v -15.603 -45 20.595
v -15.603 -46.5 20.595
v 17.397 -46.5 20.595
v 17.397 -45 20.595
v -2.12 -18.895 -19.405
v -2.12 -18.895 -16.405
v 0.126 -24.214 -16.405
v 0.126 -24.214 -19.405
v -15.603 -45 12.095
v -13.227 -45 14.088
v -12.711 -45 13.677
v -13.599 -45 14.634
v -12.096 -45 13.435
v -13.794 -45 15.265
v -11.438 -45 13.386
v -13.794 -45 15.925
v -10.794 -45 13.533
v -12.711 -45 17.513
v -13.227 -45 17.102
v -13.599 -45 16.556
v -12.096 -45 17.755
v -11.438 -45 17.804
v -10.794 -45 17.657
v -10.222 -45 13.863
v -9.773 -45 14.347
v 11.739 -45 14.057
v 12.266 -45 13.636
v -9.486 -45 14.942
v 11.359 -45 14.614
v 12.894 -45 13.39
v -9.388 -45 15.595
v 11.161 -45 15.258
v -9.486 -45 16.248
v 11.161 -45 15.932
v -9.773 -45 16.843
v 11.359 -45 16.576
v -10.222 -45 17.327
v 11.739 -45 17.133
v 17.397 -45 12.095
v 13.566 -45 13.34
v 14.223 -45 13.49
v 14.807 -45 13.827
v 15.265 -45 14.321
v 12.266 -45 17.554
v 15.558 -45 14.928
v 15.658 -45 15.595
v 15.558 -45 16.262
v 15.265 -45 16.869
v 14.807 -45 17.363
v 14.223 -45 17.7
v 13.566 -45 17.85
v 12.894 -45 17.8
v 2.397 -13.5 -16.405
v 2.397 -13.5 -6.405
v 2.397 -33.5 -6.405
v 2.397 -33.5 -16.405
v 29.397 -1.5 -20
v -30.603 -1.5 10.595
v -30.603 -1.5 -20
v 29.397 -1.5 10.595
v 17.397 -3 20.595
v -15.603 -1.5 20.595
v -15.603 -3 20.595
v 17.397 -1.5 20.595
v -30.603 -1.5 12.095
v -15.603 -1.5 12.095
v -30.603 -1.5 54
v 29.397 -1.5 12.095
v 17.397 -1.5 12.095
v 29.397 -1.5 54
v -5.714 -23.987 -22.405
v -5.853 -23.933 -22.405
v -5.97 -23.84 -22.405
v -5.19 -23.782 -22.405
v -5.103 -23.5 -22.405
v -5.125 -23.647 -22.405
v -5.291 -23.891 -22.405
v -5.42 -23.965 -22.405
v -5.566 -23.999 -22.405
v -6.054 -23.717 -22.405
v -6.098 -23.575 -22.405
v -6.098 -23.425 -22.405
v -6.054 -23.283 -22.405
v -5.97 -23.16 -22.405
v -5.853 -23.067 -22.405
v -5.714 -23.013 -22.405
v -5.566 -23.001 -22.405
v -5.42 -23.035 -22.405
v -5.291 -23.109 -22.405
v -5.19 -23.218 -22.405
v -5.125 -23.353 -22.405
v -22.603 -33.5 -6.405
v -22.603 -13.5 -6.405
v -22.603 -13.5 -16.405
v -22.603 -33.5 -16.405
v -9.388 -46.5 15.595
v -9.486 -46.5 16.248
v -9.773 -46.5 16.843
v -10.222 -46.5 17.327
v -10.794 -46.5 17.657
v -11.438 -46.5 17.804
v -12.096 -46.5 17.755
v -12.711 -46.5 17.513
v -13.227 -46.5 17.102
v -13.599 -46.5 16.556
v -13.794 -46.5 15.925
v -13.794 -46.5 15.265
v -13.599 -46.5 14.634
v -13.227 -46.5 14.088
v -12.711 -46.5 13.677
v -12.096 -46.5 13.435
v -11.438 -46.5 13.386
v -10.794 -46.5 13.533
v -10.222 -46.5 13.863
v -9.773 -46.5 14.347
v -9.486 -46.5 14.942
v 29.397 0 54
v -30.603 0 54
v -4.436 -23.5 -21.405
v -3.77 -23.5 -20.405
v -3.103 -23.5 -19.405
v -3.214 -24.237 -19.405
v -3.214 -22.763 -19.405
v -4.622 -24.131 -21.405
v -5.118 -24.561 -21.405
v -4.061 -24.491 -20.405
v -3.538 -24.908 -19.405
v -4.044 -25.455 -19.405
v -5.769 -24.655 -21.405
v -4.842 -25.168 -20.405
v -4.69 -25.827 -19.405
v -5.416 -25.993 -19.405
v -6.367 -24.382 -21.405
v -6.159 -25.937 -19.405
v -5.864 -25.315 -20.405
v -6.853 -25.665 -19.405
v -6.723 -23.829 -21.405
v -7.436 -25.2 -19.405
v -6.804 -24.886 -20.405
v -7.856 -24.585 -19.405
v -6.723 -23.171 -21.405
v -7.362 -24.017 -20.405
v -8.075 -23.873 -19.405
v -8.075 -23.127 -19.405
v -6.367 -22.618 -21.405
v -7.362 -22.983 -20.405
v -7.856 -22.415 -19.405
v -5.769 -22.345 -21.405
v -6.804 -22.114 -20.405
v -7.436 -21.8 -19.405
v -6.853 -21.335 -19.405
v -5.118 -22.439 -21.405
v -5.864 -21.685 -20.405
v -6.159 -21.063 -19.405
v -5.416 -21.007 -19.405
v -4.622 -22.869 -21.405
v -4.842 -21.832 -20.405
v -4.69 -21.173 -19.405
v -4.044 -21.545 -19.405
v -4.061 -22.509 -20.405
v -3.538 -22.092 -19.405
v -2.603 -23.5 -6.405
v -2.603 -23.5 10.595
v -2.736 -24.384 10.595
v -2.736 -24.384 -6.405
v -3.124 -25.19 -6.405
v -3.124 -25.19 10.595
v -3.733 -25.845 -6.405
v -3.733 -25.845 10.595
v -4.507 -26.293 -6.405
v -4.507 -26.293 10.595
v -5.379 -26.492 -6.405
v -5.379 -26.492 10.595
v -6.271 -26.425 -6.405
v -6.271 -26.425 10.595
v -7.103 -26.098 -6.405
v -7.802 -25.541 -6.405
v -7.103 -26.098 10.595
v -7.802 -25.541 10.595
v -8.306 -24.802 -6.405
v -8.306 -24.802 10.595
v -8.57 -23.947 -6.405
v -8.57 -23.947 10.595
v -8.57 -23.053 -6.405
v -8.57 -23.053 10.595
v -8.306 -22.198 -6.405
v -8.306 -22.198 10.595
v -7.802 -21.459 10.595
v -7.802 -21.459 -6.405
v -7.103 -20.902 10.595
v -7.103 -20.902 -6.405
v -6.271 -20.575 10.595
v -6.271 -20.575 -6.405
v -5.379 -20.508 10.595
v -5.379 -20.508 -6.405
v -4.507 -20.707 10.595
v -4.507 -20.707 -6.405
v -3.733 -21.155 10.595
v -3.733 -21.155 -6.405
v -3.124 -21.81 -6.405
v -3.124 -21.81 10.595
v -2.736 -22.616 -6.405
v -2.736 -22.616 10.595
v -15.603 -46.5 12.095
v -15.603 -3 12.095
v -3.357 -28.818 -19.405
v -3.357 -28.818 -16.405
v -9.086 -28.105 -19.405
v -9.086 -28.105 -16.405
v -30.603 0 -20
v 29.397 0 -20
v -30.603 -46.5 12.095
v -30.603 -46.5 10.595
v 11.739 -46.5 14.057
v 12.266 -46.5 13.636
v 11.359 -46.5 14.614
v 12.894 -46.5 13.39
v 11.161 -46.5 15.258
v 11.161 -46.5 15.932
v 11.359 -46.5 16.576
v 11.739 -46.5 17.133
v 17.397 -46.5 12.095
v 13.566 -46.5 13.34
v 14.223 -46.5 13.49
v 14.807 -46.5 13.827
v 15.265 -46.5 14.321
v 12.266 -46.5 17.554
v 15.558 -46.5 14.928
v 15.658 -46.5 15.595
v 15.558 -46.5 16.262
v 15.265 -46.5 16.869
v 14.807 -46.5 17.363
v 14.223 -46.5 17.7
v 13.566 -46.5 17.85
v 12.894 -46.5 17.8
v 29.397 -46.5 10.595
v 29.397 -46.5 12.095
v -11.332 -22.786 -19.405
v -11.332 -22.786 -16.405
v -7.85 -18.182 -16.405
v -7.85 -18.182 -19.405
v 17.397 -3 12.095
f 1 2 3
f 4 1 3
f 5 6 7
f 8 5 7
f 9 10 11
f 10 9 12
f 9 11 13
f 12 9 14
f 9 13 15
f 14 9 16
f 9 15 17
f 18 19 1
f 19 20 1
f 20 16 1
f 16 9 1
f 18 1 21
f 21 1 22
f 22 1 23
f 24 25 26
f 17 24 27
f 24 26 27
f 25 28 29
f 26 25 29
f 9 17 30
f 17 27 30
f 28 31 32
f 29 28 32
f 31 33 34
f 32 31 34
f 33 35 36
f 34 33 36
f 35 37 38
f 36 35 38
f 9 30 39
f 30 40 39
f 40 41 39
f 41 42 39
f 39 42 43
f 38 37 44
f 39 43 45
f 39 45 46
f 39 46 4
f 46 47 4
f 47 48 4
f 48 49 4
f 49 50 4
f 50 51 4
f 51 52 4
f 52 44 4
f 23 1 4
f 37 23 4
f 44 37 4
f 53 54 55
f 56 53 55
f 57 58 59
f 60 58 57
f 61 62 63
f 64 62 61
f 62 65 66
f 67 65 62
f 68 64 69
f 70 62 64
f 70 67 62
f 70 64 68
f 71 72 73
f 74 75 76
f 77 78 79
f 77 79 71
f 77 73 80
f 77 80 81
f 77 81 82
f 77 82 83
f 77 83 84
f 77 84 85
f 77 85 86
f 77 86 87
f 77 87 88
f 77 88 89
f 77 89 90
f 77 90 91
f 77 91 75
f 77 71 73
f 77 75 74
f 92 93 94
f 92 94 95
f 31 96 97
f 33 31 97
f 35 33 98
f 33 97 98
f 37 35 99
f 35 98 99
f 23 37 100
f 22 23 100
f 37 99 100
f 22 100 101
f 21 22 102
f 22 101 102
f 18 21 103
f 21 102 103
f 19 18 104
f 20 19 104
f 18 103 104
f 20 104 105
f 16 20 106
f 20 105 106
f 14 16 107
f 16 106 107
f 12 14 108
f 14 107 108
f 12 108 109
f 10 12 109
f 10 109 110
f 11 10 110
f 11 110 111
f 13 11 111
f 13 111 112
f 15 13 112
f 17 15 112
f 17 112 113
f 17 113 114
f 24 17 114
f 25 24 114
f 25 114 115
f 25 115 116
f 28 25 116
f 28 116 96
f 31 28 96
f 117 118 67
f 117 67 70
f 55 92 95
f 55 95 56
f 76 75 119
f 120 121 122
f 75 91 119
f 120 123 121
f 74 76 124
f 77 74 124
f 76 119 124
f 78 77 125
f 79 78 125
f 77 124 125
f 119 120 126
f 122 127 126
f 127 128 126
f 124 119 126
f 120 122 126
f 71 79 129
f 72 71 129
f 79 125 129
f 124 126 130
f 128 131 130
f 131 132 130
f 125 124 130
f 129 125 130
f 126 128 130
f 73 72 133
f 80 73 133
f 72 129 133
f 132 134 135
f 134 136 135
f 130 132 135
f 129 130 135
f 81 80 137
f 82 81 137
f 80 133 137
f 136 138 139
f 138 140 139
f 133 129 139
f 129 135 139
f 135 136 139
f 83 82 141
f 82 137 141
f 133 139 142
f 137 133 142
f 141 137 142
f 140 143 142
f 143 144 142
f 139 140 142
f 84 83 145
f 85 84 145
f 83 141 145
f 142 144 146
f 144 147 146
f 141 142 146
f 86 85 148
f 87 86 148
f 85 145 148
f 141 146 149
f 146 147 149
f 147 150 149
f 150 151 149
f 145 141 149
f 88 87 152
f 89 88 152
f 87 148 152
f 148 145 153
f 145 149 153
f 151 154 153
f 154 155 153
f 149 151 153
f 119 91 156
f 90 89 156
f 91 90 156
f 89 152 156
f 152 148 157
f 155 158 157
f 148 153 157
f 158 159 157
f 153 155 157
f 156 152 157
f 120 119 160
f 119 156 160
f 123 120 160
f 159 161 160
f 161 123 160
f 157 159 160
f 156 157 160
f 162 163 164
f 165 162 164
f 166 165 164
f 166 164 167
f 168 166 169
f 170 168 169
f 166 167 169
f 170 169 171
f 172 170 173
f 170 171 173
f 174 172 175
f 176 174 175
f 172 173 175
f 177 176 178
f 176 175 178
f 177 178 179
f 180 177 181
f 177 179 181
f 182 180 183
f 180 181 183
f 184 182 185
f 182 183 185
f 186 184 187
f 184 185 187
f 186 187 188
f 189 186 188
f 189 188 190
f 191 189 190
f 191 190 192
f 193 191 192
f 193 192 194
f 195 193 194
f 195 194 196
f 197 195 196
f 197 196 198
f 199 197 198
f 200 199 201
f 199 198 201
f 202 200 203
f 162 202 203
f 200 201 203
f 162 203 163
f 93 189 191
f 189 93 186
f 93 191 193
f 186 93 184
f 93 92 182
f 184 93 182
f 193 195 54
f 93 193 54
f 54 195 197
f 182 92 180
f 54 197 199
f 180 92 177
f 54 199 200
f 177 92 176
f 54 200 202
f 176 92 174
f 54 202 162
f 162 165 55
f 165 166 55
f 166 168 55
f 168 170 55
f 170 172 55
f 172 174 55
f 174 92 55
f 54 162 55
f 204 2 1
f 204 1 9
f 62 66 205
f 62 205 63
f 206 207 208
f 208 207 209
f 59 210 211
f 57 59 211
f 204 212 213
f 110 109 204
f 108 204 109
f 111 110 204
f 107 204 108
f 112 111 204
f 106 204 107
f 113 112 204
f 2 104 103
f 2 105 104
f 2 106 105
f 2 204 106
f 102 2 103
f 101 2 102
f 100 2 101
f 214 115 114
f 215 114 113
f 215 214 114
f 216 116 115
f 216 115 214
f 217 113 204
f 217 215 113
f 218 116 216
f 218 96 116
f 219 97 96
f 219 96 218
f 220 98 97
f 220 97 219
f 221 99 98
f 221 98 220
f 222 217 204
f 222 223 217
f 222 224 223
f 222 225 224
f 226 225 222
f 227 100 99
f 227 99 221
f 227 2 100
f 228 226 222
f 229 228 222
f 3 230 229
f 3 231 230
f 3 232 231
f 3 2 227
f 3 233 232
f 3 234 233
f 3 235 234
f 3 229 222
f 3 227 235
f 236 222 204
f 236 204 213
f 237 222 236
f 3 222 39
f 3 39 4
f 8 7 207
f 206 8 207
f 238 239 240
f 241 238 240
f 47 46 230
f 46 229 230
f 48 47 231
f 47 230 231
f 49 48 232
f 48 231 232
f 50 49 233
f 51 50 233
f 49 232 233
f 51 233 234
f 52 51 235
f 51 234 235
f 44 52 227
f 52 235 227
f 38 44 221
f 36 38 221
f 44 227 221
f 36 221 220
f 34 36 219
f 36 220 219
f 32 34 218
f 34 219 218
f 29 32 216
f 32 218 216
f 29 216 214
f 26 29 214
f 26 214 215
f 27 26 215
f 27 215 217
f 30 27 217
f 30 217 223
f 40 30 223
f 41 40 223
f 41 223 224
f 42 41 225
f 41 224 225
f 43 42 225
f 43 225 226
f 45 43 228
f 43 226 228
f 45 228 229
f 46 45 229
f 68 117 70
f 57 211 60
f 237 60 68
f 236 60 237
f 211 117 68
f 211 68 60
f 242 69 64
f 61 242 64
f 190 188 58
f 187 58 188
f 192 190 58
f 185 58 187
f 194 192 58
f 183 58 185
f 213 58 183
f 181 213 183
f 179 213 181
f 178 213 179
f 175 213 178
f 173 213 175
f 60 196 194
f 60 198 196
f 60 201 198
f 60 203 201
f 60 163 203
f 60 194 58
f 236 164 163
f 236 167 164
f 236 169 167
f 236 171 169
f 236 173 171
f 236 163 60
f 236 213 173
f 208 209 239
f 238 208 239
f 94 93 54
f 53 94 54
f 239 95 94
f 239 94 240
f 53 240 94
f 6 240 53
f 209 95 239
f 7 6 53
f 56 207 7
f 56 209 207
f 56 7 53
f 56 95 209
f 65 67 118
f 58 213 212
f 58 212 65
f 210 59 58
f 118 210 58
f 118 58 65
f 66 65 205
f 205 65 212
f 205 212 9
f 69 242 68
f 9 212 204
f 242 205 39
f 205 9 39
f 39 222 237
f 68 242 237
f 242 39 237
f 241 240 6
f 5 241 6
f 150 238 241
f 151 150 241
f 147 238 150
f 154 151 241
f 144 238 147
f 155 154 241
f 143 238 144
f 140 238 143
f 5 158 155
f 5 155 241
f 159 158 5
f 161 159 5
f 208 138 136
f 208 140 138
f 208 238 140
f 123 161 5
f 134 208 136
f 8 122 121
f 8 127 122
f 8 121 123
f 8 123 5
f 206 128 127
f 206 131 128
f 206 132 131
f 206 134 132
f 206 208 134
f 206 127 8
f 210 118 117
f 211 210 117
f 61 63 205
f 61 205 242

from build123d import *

# Parameters (mm, degrees)
F0_W      = 60
F0_H      = 74
F1_DEPTH  = 1.5
F2_W      = 33
F2_H      = 10
F3_DEPTH  = 1.5
F5_DEPTH  = 1.5
F6_W      = 33
F6_H      = 8.5
F6_H_2    = 1.5
F7_DEPTH  = 1.5
F8_R      = 2.2151606022
F8_R_2    = 2.2615912584
F9_DEPTH  = 2.5
F10_R     = 3
F11_DEPTH = 17
F12_W     = 25
F12_H     = 20
F12_R     = 3
F13_DEPTH = 10
F15_DEPTH = 3
F16_R     = 2.5
F17_DEPTH = 3
F18_SIZE2 = 2.99999
F18_SIZE  = 1.99999


# Not quite as in the source:
# - a fillet or chamfer is up to 0.001 mm smaller than in the source, because OpenCascade refuses the exact size


with BuildPart() as f1:
    # F0 (on Front) → F1 (new body)
    with BuildSketch(Plane.XZ):
        with Locations((-0.6031179801, 17)):
            Rectangle(F0_W, F0_H)
    extrude(amount=F1_DEPTH)

    # F2 (on face) → F3 (join)
    with BuildSketch(Plane.XZ.offset(1.5)):
        with Locations((0.8968820199, 15.5949131586)):
            Rectangle(F2_W, F2_H)
    extrude(amount=F3_DEPTH)

    # F4 (on face) → F5 (join)
    with BuildSketch(Plane(origin=(0, 0, 10.5949131586), x_dir=(1, 0, 0), z_dir=(0, 0, -1))):
        Polygon((-30.6031179801, 46.5), (-30.6031179801, 1.5), (-15.6031179801, 1.5), (-15.6031179801, 3), (17.3968820199, 3), (17.3968820199, 1.5), (29.3968820199, 1.5), (29.3968820199, 46.5), align=None)
    extrude(amount=-F5_DEPTH)

    # F6 (on face) → F7 (join)
    with BuildSketch(Plane.XZ.offset(46.5)):
        with Locations((0.8968820199, 16.3449131586)):
            Rectangle(F6_W, F6_H)
        with Locations((0.8968820199, 11.3449131586)):
            Rectangle(F6_W, F6_H_2)
    extrude(amount=-F7_DEPTH)

    # F8 (on face) → F9 (cut, symmetric)
    with BuildSketch(Plane.XZ.offset(46.5)):
        with Locations((-11.6031179801, 15.5949131586)):
            Circle(F8_R)
        with Locations((13.3968820199, 15.5949131586)):
            Circle(F8_R_2)
    extrude(amount=F9_DEPTH, both=True, mode=Mode.SUBTRACT)

    # F10 (on face) → F11 (join)
    with BuildSketch(Plane(origin=(0, 0, 10.5949131586), x_dir=(1, 0, 0), z_dir=(0, 0, -1))):
        with Locations((-5.6031179801, 23.5)):
            Circle(F10_R)
    extrude(amount=F11_DEPTH)

    # F12 (on face) → F13 (join)
    with BuildSketch(Plane(origin=(0, 0, -6.4050868414), x_dir=(1, 0, 0), z_dir=(0, 0, -1))):
        with Locations((-10.1031179801, 23.5)):
            Rectangle(F12_W, F12_H)
        with Locations((-5.6031179801, 23.5)):
            Circle(F12_R, mode=Mode.SUBTRACT)
        with Locations((-5.6031179801, 23.5)):
            Circle(F12_R)
    extrude(amount=F13_DEPTH)

    # F14 (on face) → F15 (join)
    with BuildSketch(Plane(origin=(0, 0, -16.4050868414), x_dir=(1, 0, 0), z_dir=(0, 0, -1))):
        Polygon((0.1261105875, 24.2136339076), (-3.3565287892, 28.8184744374), (-9.0857573568, 28.1048405298), (-11.3323465476, 22.7863660924), (-7.8497071709, 18.1815255626), (-2.1204786033, 18.8951594702), align=None)
    extrude(amount=F15_DEPTH)

    # F16 (on face) → F17 (join)
    with BuildSketch(Plane(origin=(0, 0, -19.4050868414), x_dir=(1, 0, 0), z_dir=(0, 0, -1))):
        with Locations((-5.6031179801, 23.5)):
            Circle(F16_R)
    extrude(amount=F17_DEPTH)

    # F18 (size 2 and 3 in the source; OpenCascade refuses exactly that, so slightly less here)
    f18_edges = [f1.edges().sort_by_distance(p)[0] for p in [
        (-8.103118, -23.5, -22.405087),
    ]]
    f18_side = f1.faces().sort_by_distance((-5.603118, -23.5, -22.405087))[0]
    chamfer(f18_edges, length=F18_SIZE, length2=F18_SIZE2, reference=f18_side)


solid = f1.part
